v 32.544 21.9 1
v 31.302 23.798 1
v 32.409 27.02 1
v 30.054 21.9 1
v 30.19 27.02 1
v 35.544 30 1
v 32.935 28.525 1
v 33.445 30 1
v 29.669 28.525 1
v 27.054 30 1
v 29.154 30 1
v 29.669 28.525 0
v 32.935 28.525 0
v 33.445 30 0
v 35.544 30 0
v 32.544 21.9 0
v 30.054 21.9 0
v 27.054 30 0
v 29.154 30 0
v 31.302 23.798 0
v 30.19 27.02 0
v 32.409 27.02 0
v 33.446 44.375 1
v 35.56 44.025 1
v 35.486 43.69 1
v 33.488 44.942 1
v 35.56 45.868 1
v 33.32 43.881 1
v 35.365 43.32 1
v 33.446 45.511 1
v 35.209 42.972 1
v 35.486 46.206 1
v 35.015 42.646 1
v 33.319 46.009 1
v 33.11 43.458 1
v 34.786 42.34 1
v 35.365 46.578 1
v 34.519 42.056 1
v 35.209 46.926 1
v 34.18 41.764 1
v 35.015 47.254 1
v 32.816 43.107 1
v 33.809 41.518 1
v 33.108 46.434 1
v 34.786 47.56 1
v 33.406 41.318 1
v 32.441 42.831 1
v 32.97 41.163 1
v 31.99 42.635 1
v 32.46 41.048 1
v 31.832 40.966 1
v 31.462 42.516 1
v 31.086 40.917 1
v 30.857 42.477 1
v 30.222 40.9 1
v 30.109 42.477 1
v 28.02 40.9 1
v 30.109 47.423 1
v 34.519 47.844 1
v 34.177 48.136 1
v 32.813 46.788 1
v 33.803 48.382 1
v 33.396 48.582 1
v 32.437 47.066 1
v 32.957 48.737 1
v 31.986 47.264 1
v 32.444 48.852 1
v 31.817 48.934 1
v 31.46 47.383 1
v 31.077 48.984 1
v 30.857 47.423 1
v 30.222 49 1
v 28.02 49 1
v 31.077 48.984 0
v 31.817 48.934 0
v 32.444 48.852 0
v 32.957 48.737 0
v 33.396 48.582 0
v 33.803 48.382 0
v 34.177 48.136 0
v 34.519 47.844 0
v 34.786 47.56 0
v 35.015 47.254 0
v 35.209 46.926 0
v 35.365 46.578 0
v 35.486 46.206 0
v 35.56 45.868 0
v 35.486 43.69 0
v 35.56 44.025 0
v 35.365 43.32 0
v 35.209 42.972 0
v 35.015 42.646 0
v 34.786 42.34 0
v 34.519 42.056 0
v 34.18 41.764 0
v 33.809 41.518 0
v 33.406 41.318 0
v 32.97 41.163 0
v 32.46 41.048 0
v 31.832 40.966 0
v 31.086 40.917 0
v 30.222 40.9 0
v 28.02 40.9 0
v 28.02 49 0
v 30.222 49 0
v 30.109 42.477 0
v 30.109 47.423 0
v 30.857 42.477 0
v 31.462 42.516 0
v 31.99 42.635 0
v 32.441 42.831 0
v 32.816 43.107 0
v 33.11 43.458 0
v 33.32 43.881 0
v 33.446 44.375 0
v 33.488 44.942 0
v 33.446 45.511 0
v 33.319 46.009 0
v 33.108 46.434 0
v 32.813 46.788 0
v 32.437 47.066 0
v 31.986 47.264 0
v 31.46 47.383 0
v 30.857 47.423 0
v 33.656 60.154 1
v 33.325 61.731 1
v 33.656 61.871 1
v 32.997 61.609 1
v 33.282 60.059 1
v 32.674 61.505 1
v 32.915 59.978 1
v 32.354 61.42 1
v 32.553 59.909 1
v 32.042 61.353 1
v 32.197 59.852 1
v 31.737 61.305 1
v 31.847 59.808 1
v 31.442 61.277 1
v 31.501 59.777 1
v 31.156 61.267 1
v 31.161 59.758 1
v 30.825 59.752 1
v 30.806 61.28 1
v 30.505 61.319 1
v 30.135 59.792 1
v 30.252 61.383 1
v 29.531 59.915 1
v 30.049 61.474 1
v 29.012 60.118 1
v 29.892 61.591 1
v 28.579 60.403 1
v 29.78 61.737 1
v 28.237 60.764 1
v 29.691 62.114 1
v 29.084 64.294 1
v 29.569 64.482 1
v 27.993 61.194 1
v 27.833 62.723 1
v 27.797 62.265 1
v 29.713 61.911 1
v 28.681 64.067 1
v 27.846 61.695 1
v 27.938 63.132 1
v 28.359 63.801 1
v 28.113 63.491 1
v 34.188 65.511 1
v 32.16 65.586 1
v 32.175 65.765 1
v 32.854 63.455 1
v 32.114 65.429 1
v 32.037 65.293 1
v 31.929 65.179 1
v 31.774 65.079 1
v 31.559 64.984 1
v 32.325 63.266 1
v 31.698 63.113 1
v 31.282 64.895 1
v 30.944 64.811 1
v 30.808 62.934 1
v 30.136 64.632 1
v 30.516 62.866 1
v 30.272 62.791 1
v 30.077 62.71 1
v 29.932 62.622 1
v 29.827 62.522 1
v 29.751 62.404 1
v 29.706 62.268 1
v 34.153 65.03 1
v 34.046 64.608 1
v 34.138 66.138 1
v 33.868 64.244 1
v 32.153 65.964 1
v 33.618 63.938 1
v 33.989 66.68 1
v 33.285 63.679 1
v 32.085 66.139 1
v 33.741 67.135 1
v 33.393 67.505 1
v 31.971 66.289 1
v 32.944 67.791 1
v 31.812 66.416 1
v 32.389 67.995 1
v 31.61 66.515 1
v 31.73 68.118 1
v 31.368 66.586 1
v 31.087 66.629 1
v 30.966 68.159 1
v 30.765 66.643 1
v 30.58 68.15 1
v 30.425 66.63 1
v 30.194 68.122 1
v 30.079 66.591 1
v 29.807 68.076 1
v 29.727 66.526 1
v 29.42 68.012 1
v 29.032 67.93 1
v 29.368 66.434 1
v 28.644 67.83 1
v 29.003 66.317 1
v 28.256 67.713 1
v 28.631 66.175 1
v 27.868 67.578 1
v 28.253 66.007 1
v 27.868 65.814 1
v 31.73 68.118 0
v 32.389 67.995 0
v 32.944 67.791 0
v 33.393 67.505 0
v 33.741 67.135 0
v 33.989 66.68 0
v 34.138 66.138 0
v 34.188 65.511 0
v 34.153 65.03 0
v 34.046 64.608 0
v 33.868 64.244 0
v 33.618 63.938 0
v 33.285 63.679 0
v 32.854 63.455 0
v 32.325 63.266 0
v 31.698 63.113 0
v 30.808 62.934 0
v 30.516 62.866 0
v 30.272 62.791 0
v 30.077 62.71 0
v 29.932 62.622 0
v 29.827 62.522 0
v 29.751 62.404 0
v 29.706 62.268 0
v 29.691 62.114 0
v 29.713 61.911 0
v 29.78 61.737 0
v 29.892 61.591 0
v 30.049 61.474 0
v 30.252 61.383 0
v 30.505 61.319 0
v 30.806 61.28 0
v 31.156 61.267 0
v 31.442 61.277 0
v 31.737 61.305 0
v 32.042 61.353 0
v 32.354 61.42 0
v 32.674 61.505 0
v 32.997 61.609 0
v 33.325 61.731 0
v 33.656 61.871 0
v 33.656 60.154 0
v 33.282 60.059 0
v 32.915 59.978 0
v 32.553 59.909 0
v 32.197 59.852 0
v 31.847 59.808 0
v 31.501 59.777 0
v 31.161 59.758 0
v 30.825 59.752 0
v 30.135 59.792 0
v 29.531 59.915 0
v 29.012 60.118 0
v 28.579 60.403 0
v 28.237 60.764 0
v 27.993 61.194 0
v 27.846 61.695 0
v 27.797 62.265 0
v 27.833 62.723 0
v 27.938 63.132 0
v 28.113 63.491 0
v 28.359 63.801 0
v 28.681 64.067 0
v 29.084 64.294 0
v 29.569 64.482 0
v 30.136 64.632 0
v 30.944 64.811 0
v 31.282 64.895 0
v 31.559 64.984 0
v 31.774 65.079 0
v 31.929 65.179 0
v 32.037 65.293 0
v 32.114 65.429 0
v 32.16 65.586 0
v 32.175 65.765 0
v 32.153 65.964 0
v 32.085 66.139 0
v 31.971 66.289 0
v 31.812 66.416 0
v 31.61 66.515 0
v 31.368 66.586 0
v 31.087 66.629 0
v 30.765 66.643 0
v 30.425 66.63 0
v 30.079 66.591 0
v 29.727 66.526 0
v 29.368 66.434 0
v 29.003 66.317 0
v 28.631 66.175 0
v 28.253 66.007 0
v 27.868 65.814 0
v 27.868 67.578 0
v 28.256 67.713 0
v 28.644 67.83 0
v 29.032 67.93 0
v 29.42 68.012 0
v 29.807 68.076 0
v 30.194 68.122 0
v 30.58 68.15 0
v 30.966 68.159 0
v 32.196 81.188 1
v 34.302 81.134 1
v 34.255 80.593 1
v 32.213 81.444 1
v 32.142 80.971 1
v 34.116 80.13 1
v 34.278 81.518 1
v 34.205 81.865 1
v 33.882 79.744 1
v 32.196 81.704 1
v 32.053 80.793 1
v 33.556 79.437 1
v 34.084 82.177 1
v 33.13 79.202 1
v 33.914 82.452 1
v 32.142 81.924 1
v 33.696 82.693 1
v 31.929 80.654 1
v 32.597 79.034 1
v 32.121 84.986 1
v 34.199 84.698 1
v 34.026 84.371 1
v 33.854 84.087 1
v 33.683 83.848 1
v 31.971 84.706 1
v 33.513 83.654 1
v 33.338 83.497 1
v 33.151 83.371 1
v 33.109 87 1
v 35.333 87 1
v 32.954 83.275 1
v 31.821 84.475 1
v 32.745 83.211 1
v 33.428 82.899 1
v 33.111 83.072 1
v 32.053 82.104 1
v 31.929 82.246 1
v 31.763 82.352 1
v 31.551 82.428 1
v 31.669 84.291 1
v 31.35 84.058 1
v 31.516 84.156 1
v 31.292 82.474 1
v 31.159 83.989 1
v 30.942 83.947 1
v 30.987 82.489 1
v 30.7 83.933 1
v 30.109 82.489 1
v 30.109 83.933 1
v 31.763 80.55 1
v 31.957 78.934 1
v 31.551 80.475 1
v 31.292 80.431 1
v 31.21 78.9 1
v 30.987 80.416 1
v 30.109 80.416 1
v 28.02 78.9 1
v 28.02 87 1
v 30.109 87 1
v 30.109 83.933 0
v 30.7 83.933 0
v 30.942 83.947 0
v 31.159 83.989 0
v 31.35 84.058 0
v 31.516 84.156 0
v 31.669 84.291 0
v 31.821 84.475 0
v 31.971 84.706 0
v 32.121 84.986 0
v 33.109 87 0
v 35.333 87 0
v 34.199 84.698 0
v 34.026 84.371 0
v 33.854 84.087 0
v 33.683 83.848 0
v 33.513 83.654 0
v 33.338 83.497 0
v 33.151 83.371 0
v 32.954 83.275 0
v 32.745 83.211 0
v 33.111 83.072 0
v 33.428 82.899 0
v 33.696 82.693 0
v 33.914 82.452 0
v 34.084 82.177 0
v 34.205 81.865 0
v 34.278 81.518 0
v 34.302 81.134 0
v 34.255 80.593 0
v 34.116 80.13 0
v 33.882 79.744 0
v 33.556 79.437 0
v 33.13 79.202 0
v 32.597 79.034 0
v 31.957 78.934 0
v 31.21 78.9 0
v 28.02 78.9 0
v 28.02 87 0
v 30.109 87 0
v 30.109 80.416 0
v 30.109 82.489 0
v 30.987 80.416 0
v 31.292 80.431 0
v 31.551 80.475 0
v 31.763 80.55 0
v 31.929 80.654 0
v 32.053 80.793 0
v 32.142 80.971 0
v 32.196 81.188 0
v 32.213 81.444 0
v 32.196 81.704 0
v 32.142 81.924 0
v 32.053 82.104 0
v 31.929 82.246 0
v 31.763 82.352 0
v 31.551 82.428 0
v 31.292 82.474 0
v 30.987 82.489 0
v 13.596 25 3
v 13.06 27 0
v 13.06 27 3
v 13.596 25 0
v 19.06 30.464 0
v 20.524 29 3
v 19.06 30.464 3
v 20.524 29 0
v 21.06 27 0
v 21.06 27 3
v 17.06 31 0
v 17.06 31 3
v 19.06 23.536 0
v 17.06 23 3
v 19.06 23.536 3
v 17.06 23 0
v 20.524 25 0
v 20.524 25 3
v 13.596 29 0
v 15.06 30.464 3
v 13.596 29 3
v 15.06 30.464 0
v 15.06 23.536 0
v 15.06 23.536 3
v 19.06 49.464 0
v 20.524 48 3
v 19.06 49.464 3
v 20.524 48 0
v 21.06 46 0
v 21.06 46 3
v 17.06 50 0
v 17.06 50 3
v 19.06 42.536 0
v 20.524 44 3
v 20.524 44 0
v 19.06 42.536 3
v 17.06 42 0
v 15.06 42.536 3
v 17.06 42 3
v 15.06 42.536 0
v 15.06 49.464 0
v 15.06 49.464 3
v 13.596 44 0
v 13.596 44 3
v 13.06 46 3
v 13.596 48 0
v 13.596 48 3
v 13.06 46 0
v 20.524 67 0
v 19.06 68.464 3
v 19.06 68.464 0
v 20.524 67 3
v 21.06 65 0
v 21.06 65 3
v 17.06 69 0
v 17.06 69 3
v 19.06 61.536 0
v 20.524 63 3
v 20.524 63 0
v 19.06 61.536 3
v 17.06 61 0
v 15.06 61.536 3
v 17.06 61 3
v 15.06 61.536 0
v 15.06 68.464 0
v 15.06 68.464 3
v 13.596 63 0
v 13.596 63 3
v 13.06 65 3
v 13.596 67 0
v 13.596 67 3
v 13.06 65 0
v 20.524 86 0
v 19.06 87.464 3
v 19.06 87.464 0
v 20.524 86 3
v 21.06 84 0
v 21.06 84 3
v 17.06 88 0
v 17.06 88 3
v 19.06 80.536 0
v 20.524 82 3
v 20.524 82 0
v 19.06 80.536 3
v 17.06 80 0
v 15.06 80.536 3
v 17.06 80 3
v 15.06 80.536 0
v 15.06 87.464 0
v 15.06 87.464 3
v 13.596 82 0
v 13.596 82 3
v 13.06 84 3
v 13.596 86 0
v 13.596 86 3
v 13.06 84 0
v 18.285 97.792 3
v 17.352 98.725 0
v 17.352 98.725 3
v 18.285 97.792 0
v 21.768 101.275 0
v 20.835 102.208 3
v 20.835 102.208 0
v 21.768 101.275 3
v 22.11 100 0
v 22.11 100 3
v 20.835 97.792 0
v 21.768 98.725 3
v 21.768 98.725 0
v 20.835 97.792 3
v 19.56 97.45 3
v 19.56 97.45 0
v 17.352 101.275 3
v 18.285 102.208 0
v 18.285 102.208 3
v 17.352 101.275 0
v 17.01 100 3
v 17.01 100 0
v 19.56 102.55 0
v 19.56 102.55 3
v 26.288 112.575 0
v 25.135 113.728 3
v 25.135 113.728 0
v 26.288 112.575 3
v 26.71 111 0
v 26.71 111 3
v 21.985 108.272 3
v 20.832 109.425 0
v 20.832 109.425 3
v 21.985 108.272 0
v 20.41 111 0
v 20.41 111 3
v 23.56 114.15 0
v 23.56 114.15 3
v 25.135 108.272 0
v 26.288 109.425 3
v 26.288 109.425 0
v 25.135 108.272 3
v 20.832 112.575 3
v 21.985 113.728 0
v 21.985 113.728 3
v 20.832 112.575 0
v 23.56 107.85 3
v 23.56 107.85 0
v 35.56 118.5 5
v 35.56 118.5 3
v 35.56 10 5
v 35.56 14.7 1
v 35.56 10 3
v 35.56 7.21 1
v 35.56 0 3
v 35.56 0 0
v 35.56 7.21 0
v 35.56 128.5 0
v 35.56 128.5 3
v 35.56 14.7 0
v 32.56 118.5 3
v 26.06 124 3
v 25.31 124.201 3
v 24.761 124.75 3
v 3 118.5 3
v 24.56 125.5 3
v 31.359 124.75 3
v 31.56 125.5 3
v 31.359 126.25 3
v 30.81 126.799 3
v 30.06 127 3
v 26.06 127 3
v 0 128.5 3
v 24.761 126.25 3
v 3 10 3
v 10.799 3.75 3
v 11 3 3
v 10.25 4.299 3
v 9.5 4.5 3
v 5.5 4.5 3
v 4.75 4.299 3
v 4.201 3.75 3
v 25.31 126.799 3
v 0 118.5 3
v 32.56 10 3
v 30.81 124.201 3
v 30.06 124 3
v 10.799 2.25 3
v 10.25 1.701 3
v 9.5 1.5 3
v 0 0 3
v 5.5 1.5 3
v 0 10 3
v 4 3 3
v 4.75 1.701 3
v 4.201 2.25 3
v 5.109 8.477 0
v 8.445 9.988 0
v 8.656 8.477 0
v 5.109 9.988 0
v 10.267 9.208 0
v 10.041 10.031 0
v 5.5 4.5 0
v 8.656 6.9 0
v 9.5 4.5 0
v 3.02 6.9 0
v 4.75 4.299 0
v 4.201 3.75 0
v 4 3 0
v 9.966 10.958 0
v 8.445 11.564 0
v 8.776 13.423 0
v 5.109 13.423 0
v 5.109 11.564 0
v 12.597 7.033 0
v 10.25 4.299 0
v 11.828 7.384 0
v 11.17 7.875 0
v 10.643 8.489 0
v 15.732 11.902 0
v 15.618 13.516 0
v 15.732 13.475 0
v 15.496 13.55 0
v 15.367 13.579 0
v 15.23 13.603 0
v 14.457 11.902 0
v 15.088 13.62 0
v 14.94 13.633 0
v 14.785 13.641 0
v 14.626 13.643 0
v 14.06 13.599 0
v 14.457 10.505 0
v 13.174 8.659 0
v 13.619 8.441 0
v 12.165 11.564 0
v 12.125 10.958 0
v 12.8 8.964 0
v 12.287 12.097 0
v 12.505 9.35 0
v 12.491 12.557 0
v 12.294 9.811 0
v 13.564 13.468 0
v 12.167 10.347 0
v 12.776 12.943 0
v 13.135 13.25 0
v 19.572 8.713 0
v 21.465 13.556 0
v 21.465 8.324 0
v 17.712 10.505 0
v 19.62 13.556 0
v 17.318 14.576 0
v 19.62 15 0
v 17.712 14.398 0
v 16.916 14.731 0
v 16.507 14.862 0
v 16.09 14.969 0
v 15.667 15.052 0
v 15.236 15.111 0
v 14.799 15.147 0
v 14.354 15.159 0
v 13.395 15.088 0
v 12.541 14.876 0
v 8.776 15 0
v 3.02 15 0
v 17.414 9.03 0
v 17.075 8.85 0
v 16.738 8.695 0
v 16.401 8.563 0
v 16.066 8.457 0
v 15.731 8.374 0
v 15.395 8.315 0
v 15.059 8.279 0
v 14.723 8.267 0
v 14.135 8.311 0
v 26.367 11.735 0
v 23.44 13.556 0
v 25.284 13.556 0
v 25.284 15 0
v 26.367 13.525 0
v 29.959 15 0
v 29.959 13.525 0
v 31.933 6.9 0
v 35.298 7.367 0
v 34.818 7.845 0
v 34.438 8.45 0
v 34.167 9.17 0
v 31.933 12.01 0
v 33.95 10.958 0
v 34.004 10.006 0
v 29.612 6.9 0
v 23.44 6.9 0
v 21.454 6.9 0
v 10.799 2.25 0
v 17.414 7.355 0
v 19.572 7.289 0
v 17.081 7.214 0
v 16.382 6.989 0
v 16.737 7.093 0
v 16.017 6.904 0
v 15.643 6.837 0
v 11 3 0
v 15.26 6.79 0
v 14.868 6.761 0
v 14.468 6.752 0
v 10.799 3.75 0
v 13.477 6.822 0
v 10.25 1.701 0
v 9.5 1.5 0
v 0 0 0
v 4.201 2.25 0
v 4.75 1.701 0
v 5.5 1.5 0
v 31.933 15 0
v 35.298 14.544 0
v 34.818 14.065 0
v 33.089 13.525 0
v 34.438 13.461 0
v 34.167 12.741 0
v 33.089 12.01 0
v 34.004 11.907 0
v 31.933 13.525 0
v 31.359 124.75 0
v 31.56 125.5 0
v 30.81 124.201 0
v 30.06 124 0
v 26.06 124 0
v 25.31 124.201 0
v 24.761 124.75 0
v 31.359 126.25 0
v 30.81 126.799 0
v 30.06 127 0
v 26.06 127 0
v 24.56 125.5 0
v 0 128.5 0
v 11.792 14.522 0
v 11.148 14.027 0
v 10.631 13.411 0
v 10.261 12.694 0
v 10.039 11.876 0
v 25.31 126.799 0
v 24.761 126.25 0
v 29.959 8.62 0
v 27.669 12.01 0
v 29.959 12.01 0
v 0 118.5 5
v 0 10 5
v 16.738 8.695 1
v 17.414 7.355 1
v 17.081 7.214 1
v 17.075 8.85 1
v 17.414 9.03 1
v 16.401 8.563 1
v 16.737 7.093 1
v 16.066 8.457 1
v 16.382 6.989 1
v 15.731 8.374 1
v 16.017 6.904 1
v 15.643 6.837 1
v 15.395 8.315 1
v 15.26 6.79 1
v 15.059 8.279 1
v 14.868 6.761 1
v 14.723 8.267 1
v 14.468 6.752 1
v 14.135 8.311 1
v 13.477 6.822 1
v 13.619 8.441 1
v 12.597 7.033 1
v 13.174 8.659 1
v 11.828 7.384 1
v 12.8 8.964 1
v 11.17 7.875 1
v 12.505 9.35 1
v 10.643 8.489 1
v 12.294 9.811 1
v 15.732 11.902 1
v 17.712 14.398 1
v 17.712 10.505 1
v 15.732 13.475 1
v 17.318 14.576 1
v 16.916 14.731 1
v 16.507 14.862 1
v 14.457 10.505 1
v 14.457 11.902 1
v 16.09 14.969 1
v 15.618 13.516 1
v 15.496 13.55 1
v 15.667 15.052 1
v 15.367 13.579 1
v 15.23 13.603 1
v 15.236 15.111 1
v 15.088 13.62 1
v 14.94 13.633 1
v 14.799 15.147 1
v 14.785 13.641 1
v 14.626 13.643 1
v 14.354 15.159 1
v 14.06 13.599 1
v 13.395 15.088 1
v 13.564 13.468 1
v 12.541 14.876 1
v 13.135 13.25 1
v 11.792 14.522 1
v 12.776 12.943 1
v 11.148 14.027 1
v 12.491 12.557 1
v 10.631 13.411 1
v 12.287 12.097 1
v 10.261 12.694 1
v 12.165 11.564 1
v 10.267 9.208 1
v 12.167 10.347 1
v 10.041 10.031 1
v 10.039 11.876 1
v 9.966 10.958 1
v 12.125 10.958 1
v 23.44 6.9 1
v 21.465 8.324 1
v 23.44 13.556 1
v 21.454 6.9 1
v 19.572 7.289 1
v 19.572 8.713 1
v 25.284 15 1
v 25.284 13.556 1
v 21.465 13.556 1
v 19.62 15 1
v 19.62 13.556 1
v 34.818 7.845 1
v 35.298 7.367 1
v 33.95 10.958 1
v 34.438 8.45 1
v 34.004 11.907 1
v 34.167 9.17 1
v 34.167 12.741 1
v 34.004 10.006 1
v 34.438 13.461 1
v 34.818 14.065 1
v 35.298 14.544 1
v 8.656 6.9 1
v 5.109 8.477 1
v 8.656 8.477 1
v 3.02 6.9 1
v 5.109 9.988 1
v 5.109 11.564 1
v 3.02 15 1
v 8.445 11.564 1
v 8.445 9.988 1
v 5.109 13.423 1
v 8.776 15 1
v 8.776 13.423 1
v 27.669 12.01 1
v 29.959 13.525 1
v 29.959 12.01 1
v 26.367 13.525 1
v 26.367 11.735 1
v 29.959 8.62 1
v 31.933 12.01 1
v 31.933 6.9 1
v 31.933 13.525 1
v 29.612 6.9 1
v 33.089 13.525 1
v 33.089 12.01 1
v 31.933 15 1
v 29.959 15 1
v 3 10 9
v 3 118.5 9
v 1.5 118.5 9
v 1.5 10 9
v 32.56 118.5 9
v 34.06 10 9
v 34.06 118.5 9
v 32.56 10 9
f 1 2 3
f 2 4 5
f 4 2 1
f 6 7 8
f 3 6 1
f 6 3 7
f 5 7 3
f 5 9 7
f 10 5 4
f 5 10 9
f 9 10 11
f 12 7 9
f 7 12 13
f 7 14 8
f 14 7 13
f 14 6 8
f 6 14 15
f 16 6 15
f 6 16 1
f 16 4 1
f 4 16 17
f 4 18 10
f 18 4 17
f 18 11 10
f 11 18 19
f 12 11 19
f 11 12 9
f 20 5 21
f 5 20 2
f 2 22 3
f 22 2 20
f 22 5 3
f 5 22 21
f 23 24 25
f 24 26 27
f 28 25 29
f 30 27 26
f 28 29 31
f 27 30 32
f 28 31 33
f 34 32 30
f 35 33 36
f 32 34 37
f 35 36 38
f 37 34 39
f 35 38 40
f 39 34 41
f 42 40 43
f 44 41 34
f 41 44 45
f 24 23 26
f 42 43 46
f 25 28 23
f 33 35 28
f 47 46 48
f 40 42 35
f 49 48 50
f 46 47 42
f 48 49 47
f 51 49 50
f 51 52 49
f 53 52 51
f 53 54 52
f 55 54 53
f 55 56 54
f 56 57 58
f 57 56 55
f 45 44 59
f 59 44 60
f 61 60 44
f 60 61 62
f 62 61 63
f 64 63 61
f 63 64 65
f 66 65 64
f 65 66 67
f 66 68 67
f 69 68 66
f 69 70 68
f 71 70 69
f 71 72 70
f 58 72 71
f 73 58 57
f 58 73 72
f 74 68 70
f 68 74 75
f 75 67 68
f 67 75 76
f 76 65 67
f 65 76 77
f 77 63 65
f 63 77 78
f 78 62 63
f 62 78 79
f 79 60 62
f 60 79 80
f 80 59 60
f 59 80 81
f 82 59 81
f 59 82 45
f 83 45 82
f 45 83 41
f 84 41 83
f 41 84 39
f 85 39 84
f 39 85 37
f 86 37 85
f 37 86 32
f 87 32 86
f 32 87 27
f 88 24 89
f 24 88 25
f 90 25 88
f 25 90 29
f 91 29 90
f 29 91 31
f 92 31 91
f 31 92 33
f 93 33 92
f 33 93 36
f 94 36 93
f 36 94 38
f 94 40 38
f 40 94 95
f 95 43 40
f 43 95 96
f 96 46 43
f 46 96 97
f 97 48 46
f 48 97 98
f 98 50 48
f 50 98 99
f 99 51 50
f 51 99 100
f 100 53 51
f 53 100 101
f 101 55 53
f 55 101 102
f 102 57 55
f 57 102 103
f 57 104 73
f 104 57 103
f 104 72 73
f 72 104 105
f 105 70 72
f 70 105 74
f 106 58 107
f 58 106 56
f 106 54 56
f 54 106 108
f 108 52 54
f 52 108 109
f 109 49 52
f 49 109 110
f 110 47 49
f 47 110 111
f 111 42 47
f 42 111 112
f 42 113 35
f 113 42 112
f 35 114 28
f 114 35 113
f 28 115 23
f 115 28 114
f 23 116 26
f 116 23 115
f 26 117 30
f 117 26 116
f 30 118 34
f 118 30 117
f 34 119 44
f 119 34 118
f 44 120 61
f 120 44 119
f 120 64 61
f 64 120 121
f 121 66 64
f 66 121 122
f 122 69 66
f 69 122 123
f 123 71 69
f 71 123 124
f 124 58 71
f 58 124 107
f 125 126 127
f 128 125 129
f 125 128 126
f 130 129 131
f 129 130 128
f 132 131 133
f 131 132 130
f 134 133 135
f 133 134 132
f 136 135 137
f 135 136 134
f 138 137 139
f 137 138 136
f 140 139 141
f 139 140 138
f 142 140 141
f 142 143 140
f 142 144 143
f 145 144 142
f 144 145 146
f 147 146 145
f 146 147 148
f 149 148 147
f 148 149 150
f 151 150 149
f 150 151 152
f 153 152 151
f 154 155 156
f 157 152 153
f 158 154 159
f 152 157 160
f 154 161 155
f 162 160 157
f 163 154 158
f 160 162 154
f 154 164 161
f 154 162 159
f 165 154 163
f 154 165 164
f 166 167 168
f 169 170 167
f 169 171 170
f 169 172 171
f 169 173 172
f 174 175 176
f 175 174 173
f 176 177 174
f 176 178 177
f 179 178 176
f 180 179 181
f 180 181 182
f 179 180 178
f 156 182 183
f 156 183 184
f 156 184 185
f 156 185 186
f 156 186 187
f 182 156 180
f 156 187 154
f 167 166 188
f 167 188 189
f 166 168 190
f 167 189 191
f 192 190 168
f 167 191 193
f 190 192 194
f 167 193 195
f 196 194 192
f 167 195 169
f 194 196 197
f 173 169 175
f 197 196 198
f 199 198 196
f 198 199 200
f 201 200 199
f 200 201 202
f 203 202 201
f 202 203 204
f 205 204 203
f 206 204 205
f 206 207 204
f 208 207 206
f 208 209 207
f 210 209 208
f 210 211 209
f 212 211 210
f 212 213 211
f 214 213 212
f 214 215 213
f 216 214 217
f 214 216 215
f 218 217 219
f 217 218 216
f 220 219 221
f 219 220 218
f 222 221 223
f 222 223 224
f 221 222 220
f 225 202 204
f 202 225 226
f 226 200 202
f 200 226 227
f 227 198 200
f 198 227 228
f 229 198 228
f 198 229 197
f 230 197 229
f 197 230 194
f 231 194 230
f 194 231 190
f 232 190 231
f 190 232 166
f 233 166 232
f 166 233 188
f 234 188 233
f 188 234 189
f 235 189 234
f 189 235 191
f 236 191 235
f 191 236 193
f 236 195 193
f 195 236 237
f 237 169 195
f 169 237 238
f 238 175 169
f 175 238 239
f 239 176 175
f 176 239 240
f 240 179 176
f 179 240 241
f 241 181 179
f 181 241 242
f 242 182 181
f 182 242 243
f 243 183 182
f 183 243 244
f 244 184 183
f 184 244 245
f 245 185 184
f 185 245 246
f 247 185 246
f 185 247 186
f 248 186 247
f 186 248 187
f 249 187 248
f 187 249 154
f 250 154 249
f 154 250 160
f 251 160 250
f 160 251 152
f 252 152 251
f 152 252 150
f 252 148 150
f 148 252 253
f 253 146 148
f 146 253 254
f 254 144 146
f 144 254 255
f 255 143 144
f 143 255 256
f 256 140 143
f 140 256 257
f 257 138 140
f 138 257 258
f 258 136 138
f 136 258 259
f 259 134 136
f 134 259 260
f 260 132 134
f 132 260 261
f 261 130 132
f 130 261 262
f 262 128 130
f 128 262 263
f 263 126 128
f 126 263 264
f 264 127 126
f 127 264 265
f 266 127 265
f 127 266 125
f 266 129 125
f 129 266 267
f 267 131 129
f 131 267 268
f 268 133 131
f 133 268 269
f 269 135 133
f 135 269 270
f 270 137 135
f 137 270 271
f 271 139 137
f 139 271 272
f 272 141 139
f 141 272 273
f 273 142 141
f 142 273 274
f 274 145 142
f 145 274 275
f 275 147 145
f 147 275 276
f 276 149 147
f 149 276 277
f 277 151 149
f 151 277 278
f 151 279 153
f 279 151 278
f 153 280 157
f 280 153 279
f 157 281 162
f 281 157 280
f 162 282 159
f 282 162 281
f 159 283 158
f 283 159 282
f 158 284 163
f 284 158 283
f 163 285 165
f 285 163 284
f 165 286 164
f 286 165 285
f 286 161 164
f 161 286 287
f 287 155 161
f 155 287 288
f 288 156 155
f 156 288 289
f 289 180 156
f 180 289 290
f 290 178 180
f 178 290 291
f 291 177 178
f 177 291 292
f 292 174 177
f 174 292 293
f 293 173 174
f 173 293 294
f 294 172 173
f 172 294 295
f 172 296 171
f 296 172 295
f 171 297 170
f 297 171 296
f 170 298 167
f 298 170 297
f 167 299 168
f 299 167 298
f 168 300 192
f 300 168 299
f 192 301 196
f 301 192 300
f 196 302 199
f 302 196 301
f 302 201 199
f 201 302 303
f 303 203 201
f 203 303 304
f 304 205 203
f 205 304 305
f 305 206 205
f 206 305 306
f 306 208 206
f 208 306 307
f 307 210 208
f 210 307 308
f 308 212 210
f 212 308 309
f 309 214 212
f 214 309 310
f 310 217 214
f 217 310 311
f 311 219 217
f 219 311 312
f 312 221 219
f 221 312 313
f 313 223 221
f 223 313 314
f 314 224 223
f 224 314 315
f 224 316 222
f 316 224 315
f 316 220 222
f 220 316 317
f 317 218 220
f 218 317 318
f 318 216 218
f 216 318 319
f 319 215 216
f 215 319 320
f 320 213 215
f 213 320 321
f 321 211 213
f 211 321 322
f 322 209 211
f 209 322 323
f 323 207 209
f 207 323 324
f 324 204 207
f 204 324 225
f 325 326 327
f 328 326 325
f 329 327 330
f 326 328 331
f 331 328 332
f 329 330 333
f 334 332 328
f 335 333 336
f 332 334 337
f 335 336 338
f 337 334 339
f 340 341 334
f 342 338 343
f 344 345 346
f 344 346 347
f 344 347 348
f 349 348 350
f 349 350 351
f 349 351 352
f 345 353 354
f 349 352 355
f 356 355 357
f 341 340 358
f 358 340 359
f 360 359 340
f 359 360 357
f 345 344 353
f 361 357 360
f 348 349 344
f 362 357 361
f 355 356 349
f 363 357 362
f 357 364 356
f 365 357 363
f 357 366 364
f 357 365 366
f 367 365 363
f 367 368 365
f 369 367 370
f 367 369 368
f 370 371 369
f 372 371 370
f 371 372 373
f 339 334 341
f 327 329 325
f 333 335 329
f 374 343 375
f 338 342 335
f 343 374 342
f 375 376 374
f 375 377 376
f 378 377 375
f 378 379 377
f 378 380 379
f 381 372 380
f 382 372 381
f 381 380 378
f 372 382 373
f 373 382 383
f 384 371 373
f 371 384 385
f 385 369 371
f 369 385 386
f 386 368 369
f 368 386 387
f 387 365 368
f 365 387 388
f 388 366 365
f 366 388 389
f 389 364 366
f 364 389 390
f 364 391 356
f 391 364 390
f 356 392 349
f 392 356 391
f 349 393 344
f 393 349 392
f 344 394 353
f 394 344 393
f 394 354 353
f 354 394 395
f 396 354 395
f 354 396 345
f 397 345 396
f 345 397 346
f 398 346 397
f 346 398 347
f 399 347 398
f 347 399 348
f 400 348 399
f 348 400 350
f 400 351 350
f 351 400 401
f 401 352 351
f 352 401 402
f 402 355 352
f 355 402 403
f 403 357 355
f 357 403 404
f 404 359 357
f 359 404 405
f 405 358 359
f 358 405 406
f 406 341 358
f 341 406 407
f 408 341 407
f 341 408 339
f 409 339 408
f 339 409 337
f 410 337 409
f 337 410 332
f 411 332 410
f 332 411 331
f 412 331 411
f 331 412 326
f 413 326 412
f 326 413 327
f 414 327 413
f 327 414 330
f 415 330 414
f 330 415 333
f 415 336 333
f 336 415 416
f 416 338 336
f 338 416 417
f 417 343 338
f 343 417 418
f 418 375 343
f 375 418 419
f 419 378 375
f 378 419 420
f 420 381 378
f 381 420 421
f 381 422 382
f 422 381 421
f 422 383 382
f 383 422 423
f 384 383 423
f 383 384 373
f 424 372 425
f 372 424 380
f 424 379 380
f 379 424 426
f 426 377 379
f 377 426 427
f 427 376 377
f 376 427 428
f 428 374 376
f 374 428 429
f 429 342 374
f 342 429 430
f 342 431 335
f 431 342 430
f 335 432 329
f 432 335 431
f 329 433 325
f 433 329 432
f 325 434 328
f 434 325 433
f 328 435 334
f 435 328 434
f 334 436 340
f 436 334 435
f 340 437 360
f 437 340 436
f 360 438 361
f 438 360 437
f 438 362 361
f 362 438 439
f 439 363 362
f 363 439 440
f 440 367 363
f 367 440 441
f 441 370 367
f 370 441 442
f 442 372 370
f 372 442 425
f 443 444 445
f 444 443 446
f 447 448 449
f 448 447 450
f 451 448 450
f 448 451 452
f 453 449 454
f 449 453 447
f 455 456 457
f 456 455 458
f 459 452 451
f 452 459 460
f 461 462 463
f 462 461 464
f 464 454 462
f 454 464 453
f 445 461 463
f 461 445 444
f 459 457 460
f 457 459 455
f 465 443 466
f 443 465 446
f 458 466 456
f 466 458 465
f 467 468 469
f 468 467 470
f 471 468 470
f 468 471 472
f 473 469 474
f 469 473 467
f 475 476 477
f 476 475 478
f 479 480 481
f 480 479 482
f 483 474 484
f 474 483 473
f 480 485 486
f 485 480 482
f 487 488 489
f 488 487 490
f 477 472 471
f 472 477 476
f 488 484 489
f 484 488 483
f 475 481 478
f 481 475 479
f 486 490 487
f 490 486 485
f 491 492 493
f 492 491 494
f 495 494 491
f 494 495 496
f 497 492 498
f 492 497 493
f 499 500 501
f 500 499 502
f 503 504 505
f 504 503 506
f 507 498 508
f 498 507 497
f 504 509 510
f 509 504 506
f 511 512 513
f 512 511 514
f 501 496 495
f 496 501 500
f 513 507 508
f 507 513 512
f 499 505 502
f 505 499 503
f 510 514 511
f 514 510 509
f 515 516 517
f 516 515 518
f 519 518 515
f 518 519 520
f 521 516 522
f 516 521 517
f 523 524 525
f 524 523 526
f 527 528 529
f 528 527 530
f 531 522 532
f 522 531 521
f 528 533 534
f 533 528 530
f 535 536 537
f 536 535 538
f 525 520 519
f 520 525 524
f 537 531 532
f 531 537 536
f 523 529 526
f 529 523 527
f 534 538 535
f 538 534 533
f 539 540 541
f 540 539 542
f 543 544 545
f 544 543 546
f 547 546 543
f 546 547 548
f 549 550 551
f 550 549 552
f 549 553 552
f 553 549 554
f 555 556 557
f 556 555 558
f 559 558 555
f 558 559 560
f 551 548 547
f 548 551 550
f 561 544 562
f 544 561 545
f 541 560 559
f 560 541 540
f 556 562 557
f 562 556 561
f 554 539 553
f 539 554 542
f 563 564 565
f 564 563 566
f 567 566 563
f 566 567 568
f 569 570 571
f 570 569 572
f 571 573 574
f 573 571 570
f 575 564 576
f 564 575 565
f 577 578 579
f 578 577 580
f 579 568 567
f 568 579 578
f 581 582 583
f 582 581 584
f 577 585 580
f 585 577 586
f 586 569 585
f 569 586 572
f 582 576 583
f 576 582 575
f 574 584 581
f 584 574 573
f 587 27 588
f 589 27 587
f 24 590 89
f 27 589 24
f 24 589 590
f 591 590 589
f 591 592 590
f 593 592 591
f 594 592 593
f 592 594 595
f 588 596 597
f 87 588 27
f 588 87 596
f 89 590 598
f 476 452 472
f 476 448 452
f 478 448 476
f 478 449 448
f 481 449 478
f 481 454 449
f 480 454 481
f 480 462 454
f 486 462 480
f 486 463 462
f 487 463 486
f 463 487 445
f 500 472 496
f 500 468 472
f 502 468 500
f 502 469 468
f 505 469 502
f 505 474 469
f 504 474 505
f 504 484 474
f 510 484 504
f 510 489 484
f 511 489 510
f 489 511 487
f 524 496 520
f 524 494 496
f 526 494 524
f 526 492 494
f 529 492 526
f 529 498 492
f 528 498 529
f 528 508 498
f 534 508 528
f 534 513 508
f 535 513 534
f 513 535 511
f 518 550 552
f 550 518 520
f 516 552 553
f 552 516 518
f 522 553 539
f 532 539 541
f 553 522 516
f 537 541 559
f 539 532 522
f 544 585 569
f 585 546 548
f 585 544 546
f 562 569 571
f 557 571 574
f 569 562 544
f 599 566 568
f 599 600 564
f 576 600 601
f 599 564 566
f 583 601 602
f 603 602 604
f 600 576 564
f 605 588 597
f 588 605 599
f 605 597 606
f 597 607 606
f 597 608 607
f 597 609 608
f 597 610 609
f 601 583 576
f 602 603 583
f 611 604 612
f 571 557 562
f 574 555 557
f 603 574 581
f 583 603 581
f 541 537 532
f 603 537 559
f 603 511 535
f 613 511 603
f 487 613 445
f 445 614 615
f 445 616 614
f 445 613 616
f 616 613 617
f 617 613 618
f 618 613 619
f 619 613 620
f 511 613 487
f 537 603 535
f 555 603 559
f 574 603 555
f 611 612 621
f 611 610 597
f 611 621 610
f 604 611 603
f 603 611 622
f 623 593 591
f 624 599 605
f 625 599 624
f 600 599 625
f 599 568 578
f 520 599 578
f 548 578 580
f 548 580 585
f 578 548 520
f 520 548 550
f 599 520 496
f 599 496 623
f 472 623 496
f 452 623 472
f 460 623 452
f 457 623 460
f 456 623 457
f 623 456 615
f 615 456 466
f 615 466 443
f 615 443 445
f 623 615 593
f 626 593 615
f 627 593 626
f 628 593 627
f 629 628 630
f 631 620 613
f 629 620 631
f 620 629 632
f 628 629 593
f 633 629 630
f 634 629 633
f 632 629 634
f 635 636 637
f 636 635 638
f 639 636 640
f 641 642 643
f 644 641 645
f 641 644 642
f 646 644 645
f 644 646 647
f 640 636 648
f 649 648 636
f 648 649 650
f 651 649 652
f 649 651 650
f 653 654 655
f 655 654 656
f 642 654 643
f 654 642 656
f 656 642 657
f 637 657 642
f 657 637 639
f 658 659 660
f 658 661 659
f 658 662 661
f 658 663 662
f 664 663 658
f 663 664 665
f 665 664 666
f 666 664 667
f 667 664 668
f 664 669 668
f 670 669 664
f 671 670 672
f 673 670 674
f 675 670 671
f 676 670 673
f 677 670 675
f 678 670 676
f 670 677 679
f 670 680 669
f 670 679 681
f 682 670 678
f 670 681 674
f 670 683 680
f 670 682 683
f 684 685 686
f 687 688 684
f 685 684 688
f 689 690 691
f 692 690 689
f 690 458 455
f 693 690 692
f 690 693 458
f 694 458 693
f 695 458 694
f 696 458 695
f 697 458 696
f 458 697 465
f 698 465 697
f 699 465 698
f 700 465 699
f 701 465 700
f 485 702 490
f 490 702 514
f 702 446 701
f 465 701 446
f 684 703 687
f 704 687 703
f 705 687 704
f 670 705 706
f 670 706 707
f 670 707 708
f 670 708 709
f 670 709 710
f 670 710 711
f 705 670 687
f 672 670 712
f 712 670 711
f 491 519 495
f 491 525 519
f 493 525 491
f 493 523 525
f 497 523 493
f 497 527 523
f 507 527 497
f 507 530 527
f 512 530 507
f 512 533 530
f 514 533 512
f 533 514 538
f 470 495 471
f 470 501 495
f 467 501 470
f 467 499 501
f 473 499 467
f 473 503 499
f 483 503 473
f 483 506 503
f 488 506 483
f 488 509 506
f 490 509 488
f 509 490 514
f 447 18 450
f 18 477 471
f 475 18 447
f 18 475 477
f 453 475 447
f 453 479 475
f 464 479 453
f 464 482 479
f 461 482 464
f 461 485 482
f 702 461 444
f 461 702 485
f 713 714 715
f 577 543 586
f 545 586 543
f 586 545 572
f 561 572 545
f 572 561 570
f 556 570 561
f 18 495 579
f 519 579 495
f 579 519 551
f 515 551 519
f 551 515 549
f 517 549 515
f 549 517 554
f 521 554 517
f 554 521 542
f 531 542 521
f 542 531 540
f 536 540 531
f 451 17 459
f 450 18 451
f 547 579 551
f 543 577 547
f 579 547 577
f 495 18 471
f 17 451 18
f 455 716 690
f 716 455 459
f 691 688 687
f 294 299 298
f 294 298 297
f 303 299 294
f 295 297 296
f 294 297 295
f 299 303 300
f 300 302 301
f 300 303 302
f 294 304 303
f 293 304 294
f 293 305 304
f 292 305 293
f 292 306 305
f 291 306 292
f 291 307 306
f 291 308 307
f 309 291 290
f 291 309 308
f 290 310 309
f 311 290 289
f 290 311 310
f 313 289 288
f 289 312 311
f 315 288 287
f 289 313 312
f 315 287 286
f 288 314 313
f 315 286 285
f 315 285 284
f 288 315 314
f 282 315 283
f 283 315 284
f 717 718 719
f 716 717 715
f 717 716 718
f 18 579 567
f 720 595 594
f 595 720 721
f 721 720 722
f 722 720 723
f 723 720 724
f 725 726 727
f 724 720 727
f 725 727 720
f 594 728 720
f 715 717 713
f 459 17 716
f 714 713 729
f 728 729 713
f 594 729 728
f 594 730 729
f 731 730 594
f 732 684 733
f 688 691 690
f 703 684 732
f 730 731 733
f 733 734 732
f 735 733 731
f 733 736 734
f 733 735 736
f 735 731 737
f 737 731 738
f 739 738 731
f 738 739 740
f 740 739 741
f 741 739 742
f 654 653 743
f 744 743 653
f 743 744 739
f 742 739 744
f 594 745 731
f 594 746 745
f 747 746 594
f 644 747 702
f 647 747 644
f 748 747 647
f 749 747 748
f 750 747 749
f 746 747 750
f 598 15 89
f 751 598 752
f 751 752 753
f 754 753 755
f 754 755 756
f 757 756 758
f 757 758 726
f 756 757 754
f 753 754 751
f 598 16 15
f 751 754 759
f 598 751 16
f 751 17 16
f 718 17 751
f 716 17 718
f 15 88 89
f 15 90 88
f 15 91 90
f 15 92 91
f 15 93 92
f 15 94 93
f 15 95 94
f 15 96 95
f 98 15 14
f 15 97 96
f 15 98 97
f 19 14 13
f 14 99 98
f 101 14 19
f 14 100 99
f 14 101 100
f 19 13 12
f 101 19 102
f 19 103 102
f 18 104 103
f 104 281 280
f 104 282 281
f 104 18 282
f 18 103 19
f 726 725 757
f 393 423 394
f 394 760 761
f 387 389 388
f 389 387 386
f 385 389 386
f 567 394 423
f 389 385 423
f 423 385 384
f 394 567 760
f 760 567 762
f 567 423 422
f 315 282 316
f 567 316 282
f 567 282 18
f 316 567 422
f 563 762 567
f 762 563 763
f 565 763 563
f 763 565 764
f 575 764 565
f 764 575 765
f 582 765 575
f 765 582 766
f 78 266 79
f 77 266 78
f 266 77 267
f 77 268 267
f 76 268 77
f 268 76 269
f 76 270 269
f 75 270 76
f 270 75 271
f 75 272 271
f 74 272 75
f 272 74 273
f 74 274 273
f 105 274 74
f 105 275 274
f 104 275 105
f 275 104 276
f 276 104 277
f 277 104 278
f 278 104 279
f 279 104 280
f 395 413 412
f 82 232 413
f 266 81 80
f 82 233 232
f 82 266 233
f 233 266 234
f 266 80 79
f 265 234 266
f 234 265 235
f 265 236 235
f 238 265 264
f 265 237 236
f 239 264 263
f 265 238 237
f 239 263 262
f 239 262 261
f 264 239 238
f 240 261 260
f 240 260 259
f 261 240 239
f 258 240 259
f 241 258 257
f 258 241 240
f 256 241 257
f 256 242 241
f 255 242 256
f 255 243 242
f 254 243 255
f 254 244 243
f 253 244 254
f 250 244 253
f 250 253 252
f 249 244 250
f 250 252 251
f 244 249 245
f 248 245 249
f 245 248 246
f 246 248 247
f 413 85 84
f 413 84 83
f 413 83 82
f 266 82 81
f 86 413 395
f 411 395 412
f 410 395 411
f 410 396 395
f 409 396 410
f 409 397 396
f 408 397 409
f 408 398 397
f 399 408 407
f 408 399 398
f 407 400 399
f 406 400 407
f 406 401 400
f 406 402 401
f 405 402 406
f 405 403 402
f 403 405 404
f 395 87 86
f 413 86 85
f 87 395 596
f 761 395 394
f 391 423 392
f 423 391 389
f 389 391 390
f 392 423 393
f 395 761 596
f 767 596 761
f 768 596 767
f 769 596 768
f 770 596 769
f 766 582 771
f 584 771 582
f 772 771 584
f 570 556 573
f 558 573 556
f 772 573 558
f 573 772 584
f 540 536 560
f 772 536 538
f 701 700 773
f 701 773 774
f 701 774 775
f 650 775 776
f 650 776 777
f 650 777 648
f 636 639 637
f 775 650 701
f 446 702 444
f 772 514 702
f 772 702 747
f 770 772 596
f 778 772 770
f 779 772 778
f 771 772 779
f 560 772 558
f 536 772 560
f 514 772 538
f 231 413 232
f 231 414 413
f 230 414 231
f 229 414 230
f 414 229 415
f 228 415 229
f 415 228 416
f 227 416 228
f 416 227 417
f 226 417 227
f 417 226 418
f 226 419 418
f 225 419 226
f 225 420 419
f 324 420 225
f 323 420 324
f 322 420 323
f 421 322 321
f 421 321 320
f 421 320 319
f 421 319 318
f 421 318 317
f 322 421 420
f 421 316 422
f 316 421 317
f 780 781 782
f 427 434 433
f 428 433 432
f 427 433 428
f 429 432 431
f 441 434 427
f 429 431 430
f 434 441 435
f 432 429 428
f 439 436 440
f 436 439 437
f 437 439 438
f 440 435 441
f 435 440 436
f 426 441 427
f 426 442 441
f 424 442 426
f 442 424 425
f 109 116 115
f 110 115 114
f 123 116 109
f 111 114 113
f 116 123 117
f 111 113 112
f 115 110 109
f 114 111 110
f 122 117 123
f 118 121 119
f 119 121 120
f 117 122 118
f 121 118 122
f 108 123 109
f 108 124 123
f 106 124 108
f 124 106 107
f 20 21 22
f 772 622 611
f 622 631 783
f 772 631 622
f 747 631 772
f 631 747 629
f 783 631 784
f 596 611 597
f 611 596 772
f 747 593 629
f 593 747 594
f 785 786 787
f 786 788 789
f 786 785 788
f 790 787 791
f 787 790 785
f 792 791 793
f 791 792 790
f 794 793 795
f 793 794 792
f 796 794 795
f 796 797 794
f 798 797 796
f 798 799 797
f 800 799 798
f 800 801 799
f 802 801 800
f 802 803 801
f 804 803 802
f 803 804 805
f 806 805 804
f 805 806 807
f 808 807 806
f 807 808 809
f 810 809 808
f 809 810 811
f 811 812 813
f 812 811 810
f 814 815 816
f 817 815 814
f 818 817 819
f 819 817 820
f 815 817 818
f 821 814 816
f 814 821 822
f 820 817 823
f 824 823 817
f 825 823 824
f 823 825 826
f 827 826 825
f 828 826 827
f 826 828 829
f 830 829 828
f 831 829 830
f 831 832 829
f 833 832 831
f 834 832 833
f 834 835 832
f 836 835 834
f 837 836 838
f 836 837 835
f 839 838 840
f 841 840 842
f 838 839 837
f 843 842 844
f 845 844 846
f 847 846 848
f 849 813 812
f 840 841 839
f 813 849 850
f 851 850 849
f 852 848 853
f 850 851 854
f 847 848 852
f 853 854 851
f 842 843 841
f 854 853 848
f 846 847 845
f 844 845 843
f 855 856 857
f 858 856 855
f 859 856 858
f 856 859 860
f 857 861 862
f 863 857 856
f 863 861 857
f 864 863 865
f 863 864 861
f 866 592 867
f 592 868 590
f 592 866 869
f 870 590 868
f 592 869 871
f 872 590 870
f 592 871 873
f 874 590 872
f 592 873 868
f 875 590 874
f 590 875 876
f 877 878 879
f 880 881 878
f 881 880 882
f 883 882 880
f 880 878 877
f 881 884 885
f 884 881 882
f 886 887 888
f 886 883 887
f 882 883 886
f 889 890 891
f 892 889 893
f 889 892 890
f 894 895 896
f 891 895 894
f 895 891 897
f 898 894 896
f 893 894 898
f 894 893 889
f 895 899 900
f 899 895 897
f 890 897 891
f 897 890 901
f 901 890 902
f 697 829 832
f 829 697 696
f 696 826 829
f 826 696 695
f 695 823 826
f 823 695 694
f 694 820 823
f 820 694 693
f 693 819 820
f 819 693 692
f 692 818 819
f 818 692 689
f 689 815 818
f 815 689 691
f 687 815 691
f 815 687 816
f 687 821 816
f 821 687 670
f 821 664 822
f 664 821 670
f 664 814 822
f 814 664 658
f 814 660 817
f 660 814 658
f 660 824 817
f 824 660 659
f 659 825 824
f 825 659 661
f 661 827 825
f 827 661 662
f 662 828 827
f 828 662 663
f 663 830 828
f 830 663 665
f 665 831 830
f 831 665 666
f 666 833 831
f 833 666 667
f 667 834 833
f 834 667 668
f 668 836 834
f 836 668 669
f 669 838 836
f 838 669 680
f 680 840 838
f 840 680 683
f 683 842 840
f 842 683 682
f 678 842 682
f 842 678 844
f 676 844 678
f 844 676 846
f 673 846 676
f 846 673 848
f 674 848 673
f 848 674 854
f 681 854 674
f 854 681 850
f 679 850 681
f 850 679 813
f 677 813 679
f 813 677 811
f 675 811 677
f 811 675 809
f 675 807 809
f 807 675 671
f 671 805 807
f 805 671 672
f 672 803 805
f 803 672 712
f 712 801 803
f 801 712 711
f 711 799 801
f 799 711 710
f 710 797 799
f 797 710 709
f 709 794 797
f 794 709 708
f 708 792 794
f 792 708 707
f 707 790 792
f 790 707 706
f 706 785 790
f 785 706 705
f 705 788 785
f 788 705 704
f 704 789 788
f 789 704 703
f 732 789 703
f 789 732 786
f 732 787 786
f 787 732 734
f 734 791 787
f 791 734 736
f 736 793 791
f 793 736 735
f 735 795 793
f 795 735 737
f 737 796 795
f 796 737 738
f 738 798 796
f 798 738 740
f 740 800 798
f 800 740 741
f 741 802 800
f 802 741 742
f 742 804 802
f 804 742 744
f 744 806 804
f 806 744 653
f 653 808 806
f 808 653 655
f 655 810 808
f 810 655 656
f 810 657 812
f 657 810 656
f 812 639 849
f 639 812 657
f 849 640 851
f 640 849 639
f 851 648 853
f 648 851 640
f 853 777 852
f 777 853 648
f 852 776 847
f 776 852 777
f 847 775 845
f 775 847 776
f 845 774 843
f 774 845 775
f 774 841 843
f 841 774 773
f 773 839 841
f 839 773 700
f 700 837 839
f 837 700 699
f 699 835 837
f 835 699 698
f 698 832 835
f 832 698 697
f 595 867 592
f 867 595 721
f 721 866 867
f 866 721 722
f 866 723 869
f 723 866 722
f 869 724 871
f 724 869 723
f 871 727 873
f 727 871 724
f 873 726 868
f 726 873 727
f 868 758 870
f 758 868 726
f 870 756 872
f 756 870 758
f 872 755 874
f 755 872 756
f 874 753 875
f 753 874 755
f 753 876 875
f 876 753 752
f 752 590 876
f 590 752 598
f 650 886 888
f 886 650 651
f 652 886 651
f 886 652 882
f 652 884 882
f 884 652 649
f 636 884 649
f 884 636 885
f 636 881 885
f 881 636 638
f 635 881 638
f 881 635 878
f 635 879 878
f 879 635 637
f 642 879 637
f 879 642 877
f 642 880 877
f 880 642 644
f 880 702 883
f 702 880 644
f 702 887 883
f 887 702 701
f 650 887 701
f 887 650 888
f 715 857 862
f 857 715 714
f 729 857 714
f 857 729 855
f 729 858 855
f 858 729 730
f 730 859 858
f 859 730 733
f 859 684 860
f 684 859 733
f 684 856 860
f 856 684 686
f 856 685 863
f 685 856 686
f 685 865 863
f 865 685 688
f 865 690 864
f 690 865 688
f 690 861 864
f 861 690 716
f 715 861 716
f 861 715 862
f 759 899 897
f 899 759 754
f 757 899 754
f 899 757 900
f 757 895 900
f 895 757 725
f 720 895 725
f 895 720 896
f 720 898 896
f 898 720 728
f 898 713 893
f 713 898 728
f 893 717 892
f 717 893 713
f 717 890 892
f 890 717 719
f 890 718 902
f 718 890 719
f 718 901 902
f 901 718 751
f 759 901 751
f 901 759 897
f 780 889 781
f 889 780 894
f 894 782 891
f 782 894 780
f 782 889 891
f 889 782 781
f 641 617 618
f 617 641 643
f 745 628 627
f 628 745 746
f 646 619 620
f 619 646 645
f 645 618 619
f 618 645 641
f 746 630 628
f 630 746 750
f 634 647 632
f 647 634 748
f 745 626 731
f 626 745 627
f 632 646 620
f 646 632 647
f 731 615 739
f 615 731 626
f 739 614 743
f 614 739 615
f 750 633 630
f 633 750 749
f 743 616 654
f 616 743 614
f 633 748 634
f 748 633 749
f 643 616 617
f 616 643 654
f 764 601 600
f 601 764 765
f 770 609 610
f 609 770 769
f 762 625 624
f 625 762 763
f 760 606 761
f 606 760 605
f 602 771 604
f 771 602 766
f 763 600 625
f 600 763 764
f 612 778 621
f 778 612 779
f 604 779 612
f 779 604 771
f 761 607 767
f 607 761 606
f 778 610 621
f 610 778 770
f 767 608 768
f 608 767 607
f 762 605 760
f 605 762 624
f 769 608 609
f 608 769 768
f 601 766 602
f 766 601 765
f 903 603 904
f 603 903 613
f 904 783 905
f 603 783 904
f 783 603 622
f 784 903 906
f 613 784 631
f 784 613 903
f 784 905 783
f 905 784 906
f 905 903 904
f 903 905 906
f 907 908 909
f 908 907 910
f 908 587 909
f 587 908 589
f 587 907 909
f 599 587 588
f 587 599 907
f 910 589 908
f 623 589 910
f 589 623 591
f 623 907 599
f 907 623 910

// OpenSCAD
font = ".SF Compact Display:style=Bold";
  
EuroPanel("EG140", 7);

module EuroPanel(label, hp=8) {

  sideOffset = 6;
  panelWidth = hp*5.08;

  translate([0,118.5,3]) scale([.75,1,1]) rotate([90,0,0]) Support();
  translate([panelWidth,118.5,3]) scale([-.75,1,1]) rotate([90,0,0]) Support();

  difference() {
    cube([hp*5.08, 128.5, 3]);

    translate([2,15,1]) rotate([180,0,0])  {
        linear_extrude(height=2, convexity=4) text(label, size=8, font=font);
    }

    translate([27,-1,1])  rotate([180,0,0])  {
      translate([0,-31]) {
          linear_extrude(height=4, convexity=4) text("A", size=8, font=font);
      }
      translate([0,-50])  {
          linear_extrude(height=4, convexity=4) text("D", size=8, font=font);
      }
      translate([0,-69])   {
          linear_extrude(height=4, convexity=4) text("S", size=8, font=font);
      }
      translate([0,-88])   {
          linear_extrude(height=4, convexity=4) text("R", size=8, font=font);
      }
    }

    translate([7.5,3]) MountingHole();
    translate([panelWidth - 7.5, 128.5 - 3]) MountingHole();

    translate ([panelWidth - sideOffset, 27, 0]) union() {
        KnobHole();
        translate([0,19,0]) KnobHole();
        translate([0,38,0]) KnobHole();
        translate([0,57,0]) KnobHole();
        translate([0,73,0]) LEDHole();
        translate([0,84,0]) JackHole();
    }

  }
/*
    color("green", .3)
        translate([panelWidth - sideOffset, 14.25,2])
            cube([1,100,50]);
            */
}

module KnobHole() { translate([-12.5,0,-.5]) cylinder(h=4, d=8, $fn=12); }

module JackHole() { translate([-6,0,-.5]) cylinder(h=4, d=6.3, $fn=12); }

module LEDHole() { translate([-10,0,-.5]) cylinder(h=4, d=5.1, $fn=12); }

module MIDIHole() { translate([-10,0,-.5]) cylinder(h=4, d=18, $fn=12); }

module Support() {
  linear_extrude(108.5)
    polygon([[0,0], [0,2], [2,6], [4,6], [4,0]]);
}


module MountingHole() {
  hull() {
    translate([-2,0,-.5]) cylinder(h=4, r=1.5, $fn=12);
    translate([2,0,-.5]) cylinder(h=4, r=1.5, $fn=12);
  }
}

echo(version=version());
